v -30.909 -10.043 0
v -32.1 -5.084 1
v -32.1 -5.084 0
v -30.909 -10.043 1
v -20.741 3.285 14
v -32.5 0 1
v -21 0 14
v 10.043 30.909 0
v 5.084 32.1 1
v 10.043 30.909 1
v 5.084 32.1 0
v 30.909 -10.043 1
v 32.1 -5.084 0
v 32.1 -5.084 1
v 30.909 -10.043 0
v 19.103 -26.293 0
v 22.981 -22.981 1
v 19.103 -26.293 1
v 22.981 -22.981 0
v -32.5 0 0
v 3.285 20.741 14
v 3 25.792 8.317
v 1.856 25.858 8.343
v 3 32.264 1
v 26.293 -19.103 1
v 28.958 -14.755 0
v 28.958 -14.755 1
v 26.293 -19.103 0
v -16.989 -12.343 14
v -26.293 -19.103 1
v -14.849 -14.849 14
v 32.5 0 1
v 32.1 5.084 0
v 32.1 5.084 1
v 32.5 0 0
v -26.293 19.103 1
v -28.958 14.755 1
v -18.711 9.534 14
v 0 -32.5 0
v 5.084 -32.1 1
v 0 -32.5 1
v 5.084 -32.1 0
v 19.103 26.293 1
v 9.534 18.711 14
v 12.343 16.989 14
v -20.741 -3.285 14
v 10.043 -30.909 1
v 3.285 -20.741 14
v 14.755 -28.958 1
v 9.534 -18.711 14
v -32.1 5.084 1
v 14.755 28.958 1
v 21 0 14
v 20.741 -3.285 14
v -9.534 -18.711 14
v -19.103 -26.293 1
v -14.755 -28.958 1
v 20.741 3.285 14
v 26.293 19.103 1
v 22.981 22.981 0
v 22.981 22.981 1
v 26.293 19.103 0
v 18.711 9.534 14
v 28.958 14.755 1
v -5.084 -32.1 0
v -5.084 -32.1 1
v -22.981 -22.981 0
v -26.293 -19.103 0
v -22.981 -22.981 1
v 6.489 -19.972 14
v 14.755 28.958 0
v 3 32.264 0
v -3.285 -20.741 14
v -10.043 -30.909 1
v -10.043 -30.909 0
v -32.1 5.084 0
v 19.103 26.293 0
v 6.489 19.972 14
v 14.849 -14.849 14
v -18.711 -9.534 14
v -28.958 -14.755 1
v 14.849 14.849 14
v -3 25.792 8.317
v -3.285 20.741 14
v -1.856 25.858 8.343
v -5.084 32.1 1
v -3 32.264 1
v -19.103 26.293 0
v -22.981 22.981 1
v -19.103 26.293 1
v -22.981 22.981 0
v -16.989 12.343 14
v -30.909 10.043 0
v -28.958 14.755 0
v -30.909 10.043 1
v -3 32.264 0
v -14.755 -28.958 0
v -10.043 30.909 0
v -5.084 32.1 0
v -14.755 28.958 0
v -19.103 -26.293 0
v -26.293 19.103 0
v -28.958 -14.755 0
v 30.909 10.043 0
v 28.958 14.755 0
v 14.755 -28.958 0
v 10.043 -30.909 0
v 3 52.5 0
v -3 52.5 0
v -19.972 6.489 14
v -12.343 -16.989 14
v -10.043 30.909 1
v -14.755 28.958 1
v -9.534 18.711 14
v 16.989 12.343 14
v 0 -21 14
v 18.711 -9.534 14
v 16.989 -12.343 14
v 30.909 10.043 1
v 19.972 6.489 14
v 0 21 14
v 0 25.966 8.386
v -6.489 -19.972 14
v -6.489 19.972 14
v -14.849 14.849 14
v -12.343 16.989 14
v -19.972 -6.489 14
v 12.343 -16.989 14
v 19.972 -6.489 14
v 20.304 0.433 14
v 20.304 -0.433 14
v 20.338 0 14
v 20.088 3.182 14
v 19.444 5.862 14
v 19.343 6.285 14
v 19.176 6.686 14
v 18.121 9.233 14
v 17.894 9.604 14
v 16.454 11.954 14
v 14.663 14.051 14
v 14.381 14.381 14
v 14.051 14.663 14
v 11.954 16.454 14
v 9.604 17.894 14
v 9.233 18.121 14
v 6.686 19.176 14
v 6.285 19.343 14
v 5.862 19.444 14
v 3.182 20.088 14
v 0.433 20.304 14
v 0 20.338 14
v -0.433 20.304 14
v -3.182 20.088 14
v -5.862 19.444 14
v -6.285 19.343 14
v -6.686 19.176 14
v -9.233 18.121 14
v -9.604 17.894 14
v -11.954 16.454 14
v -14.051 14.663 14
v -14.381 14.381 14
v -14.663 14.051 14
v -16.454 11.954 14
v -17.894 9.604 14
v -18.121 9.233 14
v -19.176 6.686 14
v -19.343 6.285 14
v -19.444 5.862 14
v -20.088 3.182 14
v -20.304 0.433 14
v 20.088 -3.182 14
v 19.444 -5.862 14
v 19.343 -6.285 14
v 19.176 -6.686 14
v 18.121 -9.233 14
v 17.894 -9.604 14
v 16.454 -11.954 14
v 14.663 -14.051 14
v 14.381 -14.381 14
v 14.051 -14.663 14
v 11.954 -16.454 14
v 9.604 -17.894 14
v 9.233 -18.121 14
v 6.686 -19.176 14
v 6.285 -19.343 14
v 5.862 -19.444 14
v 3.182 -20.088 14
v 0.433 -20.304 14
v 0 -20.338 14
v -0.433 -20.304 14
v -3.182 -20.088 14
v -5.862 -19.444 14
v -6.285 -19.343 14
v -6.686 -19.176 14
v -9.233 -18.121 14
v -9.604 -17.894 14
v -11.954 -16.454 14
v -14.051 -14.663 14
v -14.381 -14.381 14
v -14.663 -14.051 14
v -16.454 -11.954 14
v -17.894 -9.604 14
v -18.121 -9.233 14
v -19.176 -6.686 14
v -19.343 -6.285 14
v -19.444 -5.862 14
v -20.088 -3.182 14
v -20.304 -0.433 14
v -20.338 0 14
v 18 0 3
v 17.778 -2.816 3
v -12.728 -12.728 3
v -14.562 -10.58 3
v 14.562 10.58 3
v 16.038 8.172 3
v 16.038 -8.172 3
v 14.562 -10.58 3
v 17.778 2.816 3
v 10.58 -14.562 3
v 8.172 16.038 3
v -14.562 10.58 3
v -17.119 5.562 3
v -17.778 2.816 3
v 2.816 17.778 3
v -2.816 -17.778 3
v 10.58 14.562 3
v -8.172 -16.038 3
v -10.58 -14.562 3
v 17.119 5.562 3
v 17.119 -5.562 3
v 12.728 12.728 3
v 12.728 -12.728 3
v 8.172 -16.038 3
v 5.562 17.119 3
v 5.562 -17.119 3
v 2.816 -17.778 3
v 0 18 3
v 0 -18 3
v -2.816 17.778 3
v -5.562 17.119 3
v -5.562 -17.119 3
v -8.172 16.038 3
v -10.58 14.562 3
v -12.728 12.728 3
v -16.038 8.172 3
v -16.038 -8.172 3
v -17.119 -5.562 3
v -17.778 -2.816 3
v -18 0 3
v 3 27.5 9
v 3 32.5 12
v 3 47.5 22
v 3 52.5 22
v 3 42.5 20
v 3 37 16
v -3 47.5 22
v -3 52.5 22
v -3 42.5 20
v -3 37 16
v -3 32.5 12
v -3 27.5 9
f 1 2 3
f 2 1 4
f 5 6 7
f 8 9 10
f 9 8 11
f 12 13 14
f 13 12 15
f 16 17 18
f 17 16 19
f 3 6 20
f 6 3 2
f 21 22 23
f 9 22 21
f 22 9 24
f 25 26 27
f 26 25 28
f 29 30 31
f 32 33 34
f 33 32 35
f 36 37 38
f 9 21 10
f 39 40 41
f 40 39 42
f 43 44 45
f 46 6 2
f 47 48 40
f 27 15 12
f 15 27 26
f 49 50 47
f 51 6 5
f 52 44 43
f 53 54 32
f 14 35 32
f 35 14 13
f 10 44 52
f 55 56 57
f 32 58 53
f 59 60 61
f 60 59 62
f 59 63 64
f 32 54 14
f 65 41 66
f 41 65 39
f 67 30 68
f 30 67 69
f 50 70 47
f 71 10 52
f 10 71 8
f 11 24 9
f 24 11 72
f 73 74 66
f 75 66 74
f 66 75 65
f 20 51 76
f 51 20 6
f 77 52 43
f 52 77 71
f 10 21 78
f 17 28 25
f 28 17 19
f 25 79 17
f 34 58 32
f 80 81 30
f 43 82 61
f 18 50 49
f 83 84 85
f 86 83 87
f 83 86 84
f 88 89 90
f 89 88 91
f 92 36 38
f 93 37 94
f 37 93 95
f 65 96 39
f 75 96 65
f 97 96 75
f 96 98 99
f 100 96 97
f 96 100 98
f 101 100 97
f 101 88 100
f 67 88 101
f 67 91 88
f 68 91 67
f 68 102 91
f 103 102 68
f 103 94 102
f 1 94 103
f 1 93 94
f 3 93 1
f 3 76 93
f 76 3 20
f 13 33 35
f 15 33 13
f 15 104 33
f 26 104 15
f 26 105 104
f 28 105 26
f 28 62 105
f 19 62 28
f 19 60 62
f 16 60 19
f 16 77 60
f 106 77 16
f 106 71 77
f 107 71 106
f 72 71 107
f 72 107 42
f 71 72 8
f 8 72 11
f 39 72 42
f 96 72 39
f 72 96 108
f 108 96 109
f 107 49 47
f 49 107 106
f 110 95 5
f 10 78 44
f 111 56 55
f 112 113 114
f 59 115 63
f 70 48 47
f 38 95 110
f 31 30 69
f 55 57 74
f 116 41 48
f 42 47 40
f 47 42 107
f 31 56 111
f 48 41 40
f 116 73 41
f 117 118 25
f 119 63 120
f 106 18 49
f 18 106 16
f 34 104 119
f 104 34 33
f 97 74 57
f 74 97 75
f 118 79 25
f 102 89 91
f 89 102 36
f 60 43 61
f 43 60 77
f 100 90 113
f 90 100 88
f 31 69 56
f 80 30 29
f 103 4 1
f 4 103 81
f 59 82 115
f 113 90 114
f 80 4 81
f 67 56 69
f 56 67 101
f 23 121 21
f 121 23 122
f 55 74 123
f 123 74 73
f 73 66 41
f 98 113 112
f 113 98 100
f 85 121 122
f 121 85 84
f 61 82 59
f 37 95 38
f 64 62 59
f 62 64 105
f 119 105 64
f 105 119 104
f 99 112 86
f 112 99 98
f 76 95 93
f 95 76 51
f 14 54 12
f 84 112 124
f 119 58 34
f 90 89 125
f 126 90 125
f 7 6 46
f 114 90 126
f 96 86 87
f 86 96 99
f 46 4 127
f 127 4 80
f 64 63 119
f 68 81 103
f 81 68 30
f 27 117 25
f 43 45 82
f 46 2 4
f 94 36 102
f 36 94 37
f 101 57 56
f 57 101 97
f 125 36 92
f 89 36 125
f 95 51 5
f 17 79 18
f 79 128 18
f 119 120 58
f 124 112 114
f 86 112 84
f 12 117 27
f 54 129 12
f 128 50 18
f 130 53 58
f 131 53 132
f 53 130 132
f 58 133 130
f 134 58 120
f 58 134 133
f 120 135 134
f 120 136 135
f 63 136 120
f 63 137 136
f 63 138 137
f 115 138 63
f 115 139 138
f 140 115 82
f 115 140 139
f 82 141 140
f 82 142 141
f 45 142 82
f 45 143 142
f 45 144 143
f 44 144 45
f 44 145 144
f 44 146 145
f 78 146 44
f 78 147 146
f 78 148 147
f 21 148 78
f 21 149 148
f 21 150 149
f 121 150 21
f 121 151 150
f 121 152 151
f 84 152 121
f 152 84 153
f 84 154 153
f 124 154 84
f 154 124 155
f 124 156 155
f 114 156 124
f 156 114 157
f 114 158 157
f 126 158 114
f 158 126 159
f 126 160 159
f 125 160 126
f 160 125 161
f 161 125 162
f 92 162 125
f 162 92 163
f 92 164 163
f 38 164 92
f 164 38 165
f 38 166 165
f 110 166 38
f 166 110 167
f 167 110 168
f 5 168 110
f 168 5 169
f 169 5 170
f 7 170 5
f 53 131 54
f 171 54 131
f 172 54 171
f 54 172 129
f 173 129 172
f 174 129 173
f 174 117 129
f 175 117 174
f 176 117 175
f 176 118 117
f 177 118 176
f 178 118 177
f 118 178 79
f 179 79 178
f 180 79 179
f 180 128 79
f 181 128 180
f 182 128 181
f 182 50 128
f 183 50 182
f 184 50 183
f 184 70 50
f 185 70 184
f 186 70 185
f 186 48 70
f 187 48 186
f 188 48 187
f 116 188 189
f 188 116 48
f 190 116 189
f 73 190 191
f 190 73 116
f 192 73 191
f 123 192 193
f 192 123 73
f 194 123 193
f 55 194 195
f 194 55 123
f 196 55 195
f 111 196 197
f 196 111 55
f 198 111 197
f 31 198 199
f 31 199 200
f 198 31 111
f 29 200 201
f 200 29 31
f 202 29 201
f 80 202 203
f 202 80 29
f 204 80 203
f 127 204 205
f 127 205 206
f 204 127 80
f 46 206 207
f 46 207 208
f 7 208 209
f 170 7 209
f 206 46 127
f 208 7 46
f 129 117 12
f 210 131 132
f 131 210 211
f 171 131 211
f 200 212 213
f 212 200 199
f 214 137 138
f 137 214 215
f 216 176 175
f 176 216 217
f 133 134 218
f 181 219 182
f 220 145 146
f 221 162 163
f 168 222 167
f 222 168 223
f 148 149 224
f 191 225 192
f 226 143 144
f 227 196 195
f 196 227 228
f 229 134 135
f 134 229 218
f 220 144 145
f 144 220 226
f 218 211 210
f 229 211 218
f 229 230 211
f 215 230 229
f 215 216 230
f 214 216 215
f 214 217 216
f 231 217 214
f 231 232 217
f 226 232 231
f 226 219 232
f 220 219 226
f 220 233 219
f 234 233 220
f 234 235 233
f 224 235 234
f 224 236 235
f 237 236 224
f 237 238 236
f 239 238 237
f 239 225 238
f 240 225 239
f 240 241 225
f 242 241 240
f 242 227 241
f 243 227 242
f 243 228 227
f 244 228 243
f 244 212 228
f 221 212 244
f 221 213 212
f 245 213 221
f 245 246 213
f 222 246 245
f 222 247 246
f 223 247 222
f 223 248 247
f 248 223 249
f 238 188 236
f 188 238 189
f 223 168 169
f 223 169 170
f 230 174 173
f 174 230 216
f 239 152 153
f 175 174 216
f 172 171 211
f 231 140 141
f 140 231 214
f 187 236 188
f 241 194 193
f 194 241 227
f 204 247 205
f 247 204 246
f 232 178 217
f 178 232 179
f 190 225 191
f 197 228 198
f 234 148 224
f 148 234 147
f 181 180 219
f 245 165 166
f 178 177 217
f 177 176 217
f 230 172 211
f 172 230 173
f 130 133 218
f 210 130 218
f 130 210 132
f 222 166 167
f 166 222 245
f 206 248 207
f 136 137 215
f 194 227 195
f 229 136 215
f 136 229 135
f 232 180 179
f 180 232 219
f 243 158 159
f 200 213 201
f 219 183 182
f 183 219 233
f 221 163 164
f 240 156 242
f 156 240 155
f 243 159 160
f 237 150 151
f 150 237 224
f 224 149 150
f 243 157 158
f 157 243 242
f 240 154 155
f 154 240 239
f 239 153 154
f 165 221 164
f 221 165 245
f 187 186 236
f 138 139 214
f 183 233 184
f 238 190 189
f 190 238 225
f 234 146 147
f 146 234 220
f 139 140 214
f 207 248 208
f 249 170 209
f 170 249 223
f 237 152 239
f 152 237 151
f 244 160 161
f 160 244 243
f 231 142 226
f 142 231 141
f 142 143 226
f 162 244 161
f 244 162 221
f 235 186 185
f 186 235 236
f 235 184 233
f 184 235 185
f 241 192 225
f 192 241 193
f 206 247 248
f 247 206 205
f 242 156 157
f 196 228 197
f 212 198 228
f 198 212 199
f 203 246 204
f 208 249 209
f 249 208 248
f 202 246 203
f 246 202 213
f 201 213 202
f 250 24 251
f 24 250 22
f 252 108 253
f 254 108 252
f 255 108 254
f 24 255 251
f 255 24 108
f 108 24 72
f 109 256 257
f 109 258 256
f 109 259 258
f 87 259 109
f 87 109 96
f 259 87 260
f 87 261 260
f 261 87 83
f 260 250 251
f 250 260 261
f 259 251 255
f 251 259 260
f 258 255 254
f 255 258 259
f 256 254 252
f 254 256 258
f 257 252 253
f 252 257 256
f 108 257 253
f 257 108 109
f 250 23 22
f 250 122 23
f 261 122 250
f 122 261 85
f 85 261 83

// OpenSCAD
// file: ../lib/lib_utils.scad
/**
* cut a model in half, removing the +x portion
*/
module half(bounds, active=true) {
  x=bounds[0] + (bounds[0]*0.1);
  y=bounds[1] + (bounds[1]*0.1);;
  z=bounds[2] + (bounds[2]*0.1);;
  
  if (active==true) {
    difference() {
      children();
      translate([0,-y/2,-(bounds[2]*0.1)/2])
        color("Crimson")
          cube([x/2,y,z]);
    }
  } else {
    children();
  }
}

module mirror_copy(v=[0,0,1], offset=[0,0,0]){
  children();
  mirror(v)translate(offset)children();
}

/**
* duplicate and rotate the children around the y axis
*/
module rotate_count(count, deg=0) {
  if (count == 1){
    children();
  } else if (count > 1){
    for (i=[1 : count-1]){
      children();
      if (deg>0){
        rotate([0,0,deg*i])
          children();
      } else {
        rotate([0,0,(360/count)*i])
          children();
      }
    }
  }
}

/**
* cut a hole in child objects along the Z axis
*/
module hole(d, r, draft=0, trans=[0,0,0], rot=[0,0,0]){
  difference(){
    children();
    translate(trans){
      rotate(rot)
      rotate([180,0,0]){
        if (draft>0) {
          opp_ang=90-draft;
          top_r=r+(d/sin(opp_ang)*sin(draft));
          cylinder(h=d, r1=top_r, r2=r);
        } else {
          cylinder(h=d, r=r);
        }
      }
    }
  }
  
}

/**
*
*/
module multiHull(){
    for (i = [1 : $children-1])
        hull(){
            children(0);
            children(i);
        }
}

/**
*
*/
module sequentialHull(){
    for (i = [0: $children-2])
        hull(){
            children(i);
            children(i+1);
        }
}

module innerRectFillet(s=[2,2], w=1, profile="flat"){
  w=w/sqrt(2);
  if(profile=="flat"){
    translate([-w,-w,0])
      cube([s[0]+w*2, s[1]+w*2, w*0.1]);
    CubePoints = [
      [     -w,      -w,   0 ],  //0
      [ s[0]+w,      -w,   0 ],  //1
      [ s[0]+w,  s[1]+w,   0 ],  //2
      [     -w,  s[1]+w,   0 ],  //3
      [      0,       0,  -w ],  //4
      [   s[0],       0,  -w ],  //5
      [   s[0],    s[1],  -w ],  //6
      [      0,    s[1],  -w ]]; //7
      
    CubeFaces = [
      [0,1,2,3],  // bottom
      [4,5,1,0],  // front
      [7,6,5,4],  // top
      [5,6,2,1],  // right
      [6,7,3,2],  // back
      [7,4,0,3]]; // left
      
    polyhedron( CubePoints, CubeFaces );
  }
  else if(profile=="round"){
    f_fn=$fn/4;
    translate([-w,-w,-w]){
      difference(){
        cube([s[0]+w*2, s[1]+w*2, w+w*0.1]);
        union(){
          mirror_copy(offset=[0,s[1]+w*2, 0])
            rotate([0,90,0])
              cylinder(h=s[0]+w*2, r=w, $fn=f_fn);
          mirror_copy(offset=[s[0]+w*2,0,0])
            rotate([0,90,90])
              cylinder(h=s[1]+w*2, r=w, $fn=f_fn);
          
        }
      }
    }
  } else{
    assert(false, "profile must be one of [\"flat\", \"round\"]");
  }
}


module innerCircFillet(r=2, w=1, profile="flat", $fn=$fn){
  w=w/sqrt(2);
  if(profile=="flat"){
    cylinder(h=w*0.1, r=r+w);
    translate([0,0,-w])
      cylinder(h=w, r1=r, r2=r+w);
  }
  else if(profile=="round"){
    points=[[-w,r], [-w,0], [0,0], [w*0.1, 0], [w*0.1, r+w], [0,r+w]];
    arc = [ for (a = [0 : 9 : 90]) w * [ sin(a), -cos(a)] ];
    moved = [ for (i = arc) i+[-w, r+w]];
    
    rotate_extrude()
      rotate([0,0,90])
        polygon(concat(points, moved), convexity=5);
    
  } else{
    assert(false, "profile must be one of [\"flat\", \"round\"]");
  }
}
// main file
include <../lib/lib_utils.scad>
/////////////////////////////
// ANT TRAP BAIT CONTAINER //
/////////////////////////////

$fn = 40;
CUT_IN_HALF=false;

OD=65;  // mm
HOLE=40;  // mm
HEIGHT=13;  // mm
TH=6;  // mm

module make(){
  hole(d=HEIGHT, r=HOLE/2-2, draft=12, trans=[0,0,HEIGHT+3]) {
    hull() {
      cylinder(h=1, d=OD);
      translate([0,0,HEIGHT])
        cylinder(h=1, d=HOLE+2);
    }
  }
  rotate([0,-90,0])
  translate([0,OD/2-10,-TH/2])
  linear_extrude(TH)
    polygon([
  [0,0],
  [0,30],
  [22,30],
  [22,25],
  [20,20],
  [16,14.5],
  [12,10],
  [9,5],
  [7,0]
    ]);
}

half([OD,OD,HEIGHT*2], CUT_IN_HALF){
  make();
}
